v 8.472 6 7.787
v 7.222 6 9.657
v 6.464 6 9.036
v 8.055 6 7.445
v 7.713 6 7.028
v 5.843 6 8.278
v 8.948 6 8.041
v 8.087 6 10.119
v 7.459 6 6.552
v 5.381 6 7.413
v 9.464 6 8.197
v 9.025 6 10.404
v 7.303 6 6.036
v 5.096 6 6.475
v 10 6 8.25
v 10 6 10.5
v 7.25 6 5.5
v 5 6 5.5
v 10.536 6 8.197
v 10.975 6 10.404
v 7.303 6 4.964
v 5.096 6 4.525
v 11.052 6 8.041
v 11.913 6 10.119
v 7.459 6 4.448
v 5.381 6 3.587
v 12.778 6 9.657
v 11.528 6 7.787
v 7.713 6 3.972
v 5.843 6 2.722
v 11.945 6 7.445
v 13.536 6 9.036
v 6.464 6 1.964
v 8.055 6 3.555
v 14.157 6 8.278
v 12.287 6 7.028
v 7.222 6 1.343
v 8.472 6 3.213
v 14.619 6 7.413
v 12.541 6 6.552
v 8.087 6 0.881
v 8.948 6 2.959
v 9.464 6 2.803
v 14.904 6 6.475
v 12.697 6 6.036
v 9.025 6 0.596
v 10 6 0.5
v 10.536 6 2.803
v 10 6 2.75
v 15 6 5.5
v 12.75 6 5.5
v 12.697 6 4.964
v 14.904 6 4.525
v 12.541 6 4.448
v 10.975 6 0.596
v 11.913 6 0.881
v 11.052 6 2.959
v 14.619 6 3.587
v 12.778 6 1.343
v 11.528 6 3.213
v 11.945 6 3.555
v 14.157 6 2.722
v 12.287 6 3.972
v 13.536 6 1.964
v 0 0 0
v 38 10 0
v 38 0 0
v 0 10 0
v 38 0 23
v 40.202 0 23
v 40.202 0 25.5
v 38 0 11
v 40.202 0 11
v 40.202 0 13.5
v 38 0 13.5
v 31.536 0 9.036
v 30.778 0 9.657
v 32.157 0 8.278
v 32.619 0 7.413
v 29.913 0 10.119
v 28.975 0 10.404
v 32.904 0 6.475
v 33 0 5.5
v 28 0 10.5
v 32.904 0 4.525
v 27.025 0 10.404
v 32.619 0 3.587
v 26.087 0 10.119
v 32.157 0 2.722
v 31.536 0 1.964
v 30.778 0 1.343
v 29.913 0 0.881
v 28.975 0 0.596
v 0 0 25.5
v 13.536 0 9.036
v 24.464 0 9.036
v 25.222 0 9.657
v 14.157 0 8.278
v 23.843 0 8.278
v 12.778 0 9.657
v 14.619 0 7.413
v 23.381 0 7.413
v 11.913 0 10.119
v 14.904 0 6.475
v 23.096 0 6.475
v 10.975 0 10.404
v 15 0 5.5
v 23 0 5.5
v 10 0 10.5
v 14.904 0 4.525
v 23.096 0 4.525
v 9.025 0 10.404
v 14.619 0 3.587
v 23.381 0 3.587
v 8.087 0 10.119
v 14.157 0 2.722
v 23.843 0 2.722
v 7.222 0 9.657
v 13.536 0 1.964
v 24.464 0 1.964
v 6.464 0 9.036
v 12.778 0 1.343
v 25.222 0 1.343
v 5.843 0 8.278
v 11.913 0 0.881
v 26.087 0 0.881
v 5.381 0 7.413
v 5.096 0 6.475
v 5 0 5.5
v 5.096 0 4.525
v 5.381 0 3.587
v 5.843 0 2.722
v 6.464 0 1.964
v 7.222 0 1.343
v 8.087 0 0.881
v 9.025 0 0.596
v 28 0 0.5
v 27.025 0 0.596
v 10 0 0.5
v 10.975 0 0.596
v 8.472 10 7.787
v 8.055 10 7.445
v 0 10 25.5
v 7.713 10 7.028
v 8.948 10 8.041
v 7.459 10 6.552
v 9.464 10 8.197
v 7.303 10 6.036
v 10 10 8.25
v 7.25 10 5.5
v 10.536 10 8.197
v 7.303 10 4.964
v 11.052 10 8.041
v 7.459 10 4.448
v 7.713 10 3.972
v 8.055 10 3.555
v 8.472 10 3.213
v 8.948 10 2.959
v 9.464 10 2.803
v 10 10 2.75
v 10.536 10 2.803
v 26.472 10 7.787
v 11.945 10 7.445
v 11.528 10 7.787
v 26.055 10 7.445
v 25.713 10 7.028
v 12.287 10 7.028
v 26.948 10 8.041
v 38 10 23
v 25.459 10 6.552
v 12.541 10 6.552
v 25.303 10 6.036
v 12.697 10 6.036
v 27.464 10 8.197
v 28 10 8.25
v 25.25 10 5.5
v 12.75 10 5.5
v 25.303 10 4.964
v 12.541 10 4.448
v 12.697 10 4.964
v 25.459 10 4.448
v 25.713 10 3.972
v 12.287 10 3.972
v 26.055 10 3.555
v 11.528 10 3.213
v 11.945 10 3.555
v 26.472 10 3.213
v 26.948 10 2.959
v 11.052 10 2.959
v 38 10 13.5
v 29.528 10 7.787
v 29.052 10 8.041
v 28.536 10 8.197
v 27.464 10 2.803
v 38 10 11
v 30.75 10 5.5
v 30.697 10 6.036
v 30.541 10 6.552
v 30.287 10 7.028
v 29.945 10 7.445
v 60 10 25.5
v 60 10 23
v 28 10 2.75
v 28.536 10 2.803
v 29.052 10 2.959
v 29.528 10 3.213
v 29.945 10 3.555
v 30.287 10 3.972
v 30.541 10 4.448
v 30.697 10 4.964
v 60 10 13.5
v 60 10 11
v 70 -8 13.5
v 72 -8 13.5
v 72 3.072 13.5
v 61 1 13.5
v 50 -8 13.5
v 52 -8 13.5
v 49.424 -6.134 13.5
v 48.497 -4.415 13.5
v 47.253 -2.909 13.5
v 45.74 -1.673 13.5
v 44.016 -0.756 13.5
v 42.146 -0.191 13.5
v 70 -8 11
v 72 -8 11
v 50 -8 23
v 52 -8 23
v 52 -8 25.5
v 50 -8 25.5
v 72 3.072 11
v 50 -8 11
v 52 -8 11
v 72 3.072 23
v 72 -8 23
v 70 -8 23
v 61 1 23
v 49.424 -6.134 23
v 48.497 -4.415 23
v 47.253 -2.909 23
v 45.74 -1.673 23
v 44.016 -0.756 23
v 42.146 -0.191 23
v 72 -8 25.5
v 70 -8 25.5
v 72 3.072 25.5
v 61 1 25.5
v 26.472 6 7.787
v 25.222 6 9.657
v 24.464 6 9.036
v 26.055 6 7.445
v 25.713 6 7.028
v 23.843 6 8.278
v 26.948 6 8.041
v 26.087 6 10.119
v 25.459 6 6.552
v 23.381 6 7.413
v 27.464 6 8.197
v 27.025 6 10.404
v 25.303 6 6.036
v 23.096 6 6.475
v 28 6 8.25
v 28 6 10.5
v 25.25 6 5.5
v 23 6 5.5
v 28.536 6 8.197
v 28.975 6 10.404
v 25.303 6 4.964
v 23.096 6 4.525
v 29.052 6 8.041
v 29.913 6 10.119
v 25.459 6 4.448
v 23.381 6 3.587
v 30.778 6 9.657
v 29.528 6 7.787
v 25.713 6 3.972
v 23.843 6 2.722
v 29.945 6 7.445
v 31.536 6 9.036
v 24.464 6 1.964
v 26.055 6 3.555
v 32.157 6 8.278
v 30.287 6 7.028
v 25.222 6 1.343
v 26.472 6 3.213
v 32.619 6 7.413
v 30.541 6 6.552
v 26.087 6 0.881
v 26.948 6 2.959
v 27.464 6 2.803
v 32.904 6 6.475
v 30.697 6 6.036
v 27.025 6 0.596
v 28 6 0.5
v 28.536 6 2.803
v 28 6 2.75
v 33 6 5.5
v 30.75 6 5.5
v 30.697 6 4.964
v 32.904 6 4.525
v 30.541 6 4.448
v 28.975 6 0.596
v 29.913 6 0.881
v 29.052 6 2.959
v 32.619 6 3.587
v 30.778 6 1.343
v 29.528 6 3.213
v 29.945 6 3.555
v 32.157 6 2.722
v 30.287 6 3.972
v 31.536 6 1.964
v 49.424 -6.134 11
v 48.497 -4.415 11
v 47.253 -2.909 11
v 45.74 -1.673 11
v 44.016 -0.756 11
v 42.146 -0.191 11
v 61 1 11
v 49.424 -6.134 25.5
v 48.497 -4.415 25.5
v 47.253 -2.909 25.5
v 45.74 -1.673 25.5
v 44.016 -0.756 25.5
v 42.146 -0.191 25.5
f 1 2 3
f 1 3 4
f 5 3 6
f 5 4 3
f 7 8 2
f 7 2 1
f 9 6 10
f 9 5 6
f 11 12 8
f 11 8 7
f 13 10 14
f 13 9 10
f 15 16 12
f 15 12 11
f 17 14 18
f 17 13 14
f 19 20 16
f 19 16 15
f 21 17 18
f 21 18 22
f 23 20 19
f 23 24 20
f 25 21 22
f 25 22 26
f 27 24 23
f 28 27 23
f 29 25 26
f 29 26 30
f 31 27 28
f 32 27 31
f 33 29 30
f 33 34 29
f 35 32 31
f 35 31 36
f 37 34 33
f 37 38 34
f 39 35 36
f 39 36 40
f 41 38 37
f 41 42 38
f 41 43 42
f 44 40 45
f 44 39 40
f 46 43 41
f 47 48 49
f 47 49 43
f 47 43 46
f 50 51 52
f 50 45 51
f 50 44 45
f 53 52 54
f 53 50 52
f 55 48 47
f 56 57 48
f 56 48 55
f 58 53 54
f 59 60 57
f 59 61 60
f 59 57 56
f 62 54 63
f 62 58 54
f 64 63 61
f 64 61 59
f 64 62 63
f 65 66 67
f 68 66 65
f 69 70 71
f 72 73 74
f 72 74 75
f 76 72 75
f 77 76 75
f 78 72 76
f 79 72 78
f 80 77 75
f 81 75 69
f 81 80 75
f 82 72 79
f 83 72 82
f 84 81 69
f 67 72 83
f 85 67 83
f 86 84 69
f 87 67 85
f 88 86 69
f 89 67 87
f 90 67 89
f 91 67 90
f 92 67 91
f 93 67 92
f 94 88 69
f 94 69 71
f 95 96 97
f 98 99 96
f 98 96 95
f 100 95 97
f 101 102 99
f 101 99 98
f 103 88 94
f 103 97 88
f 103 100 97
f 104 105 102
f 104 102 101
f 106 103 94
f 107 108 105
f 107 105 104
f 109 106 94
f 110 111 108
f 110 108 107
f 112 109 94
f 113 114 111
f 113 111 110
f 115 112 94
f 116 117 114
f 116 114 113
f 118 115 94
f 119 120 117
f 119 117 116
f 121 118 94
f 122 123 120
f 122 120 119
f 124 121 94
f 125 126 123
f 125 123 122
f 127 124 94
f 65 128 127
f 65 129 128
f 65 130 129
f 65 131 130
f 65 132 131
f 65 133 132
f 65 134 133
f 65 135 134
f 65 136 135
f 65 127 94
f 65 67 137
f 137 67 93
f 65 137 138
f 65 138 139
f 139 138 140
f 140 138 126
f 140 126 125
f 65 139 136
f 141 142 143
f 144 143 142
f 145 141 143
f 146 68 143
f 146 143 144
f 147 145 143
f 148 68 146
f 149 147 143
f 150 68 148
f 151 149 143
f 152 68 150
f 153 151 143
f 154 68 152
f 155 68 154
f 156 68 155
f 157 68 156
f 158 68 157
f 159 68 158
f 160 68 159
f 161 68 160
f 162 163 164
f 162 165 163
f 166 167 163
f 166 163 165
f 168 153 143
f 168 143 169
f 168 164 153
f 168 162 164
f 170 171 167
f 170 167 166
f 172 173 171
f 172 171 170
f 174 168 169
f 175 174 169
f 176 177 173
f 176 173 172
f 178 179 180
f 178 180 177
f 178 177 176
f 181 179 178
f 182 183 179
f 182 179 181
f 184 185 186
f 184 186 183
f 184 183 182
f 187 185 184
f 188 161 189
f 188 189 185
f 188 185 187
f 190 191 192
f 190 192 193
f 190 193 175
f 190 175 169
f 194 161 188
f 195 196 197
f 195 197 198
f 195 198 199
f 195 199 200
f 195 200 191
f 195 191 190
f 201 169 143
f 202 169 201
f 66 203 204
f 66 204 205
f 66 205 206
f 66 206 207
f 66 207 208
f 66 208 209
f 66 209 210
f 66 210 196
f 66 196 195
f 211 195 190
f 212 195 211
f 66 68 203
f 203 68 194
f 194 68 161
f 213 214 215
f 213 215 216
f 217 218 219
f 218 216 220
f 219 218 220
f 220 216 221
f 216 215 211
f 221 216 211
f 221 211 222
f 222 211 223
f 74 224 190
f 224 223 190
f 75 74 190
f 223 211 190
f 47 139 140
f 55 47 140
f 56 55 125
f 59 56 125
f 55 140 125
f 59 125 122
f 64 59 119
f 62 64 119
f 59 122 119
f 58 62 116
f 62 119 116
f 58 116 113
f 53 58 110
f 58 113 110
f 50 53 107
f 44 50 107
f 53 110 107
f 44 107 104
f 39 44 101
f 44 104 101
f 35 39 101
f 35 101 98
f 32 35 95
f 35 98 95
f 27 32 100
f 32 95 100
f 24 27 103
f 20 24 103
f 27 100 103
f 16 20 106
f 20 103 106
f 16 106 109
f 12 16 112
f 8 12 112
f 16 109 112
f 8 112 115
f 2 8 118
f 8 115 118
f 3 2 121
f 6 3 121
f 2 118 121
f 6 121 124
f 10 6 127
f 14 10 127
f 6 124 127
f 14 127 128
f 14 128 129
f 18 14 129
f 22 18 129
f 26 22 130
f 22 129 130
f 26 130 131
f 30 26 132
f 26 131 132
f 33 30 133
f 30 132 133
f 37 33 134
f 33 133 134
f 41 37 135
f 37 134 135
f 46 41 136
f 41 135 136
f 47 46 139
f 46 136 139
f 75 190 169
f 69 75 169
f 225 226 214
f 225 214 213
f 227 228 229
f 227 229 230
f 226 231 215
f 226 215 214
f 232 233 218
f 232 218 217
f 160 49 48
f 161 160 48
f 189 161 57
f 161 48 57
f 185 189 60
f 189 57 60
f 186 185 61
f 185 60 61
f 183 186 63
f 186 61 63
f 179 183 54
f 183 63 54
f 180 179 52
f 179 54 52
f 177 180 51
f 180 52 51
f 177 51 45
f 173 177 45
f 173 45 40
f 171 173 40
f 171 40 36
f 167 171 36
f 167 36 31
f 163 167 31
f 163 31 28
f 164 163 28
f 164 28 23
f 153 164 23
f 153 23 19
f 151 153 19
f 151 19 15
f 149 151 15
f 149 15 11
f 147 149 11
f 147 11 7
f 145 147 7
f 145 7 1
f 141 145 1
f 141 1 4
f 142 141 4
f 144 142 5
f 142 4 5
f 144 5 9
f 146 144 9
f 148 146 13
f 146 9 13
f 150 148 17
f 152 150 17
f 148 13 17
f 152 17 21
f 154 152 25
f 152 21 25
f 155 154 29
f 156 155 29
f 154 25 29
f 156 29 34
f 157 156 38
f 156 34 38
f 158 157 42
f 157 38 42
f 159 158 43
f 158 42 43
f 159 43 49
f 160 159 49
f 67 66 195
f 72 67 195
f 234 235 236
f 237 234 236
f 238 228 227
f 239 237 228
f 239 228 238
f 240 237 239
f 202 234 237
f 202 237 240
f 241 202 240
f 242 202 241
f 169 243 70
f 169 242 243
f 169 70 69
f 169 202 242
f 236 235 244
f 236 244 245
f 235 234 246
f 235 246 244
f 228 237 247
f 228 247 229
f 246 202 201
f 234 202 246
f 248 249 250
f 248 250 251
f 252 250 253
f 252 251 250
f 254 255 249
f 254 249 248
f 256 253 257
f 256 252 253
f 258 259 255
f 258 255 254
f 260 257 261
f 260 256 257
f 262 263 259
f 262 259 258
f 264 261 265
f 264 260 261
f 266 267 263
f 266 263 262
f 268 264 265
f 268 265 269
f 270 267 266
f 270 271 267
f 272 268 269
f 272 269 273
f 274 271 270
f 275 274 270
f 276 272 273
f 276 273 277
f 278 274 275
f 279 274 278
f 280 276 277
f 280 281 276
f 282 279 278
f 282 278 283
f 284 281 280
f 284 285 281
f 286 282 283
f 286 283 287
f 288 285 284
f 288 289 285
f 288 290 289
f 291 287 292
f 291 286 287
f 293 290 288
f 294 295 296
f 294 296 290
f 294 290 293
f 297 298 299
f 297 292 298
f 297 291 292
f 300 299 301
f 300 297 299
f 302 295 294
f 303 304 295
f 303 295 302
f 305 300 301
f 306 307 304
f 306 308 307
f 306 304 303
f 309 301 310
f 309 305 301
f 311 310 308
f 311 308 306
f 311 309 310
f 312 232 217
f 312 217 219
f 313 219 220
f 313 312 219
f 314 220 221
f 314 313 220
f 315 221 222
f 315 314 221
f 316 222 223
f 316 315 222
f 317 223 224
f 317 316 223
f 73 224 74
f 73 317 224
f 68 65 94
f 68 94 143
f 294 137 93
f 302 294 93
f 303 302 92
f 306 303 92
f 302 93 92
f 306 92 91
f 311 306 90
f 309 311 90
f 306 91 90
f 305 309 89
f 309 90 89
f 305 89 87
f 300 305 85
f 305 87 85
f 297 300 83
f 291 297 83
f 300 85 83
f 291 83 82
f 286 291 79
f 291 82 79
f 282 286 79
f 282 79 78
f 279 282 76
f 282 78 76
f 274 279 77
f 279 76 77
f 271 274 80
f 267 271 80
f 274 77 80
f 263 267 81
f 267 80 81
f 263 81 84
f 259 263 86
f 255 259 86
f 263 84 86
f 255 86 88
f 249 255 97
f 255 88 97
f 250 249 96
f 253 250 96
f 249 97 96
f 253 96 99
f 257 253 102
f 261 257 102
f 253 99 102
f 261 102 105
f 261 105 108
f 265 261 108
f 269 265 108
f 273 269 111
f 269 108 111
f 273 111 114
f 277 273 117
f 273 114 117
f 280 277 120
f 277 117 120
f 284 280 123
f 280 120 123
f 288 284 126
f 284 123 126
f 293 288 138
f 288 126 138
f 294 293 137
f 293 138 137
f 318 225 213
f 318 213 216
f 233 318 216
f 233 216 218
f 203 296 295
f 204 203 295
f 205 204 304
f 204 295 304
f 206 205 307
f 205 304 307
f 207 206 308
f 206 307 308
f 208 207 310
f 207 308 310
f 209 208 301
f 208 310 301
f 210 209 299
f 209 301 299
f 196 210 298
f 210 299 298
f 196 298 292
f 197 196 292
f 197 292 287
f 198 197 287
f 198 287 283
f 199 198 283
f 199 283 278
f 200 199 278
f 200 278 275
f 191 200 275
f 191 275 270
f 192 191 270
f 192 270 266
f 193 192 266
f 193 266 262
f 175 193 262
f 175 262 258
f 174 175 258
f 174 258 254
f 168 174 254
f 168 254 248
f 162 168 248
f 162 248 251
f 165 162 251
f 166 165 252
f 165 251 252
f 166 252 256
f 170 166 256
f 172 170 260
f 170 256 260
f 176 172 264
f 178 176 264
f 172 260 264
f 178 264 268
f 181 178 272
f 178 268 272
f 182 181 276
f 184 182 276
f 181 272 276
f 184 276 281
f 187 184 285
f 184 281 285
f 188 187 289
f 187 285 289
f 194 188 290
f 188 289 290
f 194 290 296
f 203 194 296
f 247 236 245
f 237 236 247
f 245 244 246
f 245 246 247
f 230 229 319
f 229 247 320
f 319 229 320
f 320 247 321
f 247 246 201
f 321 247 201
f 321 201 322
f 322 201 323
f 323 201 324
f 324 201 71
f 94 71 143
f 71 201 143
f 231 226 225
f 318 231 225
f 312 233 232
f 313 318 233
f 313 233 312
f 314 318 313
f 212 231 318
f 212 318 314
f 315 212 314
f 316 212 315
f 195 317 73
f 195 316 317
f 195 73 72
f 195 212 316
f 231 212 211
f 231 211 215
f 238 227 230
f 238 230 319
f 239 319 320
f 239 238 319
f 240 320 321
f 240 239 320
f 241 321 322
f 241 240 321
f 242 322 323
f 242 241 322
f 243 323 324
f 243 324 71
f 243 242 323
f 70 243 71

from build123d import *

# Parameters (mm, degrees)
BASE_EXTRUSION_DEPTH    = 25.5
ESQUISSE2_W             = 56.002380091
ESQUISSE2_H             = 22.364539332
ENL_V_MAT_EXTRU_1_DEPTH = 79.474518157
ESQUISSE3_W             = 40.935077574
ESQUISSE3_H             = 9.5
ENL_V_MAT_EXTRU_2_DEPTH = 79.474518157
ESQUISSE4_R             = 5
ENL_V_MAT_EXTRU_3_DEPTH = 6
ESQUISSE5_R             = 2.75
ENL_V_MAT_EXTRU_4_DEPTH = 6


with BuildPart() as part:
    # Esquisse1 → Base-Extrusion (new body)
    with BuildSketch(Plane.XY):
        with BuildLine():
            Line((0, 0), (0, 10))
            Line((0, 10), (60, 10))
            Line((60, 10), (72, 3.07179677))
            Line((72, 3.07179677), (72, -8))
            Line((72, -8), (70, -8))
            Line((70, -8), (61, 1))
            Line((61, 1), (52, -8))
            Line((52, -8), (50, -8))
            ThreePointArc((50, -8), (46.526596349, -2.254033308), (40.202041029, 0))
            Line((40.202041029, 0), (0, 0))
        make_face()
    extrude(amount=BASE_EXTRUSION_DEPTH)

    # Esquisse2 → Enlèv. mat.-Extru.1 (cut, through all)
    with BuildSketch(Plane(origin=(0, 10, 0), x_dir=(-1, 0, 0), z_dir=(0, 1, 0))):
        with Locations((-66.001190046, -0.182269666)):
            Rectangle(ESQUISSE2_W, ESQUISSE2_H)
    extrude(amount=-ENL_V_MAT_EXTRU_1_DEPTH, mode=Mode.SUBTRACT)

    # Esquisse3 → Enlèv. mat.-Extru.2 (cut, through all)
    with BuildSketch(Plane(origin=(0, 10, 0), x_dir=(-1, 0, 0), z_dir=(0, 1, 0))):
        with Locations((-58.467538787, 18.25)):
            Rectangle(ESQUISSE3_W, ESQUISSE3_H)
    extrude(amount=-ENL_V_MAT_EXTRU_2_DEPTH, mode=Mode.SUBTRACT)

    # Esquisse4 → Enlèv. mat.-Extru.3 (cut)
    with BuildSketch(Plane.XZ):
        with Locations(Location((10, 5.5, 0), (0, 0, 270))):
            Circle(ESQUISSE4_R)
        with Locations(Location((28, 5.5, 0), (0, 0, 270))):
            Circle(ESQUISSE4_R)
    extrude(amount=-ENL_V_MAT_EXTRU_3_DEPTH, mode=Mode.SUBTRACT)

    # Esquisse5 → Enlèv. mat.-Extru.4 (cut)
    with BuildSketch(Plane.XZ.offset(-6)):
        with Locations(Location((28, 5.5, 0), (0, 0, 270))):
            Circle(ESQUISSE5_R)
        with Locations(Location((10, 5.5, 0), (0, 0, 270))):
            Circle(ESQUISSE5_R)
    extrude(amount=-ENL_V_MAT_EXTRU_4_DEPTH, mode=Mode.SUBTRACT)


solid = part.part
